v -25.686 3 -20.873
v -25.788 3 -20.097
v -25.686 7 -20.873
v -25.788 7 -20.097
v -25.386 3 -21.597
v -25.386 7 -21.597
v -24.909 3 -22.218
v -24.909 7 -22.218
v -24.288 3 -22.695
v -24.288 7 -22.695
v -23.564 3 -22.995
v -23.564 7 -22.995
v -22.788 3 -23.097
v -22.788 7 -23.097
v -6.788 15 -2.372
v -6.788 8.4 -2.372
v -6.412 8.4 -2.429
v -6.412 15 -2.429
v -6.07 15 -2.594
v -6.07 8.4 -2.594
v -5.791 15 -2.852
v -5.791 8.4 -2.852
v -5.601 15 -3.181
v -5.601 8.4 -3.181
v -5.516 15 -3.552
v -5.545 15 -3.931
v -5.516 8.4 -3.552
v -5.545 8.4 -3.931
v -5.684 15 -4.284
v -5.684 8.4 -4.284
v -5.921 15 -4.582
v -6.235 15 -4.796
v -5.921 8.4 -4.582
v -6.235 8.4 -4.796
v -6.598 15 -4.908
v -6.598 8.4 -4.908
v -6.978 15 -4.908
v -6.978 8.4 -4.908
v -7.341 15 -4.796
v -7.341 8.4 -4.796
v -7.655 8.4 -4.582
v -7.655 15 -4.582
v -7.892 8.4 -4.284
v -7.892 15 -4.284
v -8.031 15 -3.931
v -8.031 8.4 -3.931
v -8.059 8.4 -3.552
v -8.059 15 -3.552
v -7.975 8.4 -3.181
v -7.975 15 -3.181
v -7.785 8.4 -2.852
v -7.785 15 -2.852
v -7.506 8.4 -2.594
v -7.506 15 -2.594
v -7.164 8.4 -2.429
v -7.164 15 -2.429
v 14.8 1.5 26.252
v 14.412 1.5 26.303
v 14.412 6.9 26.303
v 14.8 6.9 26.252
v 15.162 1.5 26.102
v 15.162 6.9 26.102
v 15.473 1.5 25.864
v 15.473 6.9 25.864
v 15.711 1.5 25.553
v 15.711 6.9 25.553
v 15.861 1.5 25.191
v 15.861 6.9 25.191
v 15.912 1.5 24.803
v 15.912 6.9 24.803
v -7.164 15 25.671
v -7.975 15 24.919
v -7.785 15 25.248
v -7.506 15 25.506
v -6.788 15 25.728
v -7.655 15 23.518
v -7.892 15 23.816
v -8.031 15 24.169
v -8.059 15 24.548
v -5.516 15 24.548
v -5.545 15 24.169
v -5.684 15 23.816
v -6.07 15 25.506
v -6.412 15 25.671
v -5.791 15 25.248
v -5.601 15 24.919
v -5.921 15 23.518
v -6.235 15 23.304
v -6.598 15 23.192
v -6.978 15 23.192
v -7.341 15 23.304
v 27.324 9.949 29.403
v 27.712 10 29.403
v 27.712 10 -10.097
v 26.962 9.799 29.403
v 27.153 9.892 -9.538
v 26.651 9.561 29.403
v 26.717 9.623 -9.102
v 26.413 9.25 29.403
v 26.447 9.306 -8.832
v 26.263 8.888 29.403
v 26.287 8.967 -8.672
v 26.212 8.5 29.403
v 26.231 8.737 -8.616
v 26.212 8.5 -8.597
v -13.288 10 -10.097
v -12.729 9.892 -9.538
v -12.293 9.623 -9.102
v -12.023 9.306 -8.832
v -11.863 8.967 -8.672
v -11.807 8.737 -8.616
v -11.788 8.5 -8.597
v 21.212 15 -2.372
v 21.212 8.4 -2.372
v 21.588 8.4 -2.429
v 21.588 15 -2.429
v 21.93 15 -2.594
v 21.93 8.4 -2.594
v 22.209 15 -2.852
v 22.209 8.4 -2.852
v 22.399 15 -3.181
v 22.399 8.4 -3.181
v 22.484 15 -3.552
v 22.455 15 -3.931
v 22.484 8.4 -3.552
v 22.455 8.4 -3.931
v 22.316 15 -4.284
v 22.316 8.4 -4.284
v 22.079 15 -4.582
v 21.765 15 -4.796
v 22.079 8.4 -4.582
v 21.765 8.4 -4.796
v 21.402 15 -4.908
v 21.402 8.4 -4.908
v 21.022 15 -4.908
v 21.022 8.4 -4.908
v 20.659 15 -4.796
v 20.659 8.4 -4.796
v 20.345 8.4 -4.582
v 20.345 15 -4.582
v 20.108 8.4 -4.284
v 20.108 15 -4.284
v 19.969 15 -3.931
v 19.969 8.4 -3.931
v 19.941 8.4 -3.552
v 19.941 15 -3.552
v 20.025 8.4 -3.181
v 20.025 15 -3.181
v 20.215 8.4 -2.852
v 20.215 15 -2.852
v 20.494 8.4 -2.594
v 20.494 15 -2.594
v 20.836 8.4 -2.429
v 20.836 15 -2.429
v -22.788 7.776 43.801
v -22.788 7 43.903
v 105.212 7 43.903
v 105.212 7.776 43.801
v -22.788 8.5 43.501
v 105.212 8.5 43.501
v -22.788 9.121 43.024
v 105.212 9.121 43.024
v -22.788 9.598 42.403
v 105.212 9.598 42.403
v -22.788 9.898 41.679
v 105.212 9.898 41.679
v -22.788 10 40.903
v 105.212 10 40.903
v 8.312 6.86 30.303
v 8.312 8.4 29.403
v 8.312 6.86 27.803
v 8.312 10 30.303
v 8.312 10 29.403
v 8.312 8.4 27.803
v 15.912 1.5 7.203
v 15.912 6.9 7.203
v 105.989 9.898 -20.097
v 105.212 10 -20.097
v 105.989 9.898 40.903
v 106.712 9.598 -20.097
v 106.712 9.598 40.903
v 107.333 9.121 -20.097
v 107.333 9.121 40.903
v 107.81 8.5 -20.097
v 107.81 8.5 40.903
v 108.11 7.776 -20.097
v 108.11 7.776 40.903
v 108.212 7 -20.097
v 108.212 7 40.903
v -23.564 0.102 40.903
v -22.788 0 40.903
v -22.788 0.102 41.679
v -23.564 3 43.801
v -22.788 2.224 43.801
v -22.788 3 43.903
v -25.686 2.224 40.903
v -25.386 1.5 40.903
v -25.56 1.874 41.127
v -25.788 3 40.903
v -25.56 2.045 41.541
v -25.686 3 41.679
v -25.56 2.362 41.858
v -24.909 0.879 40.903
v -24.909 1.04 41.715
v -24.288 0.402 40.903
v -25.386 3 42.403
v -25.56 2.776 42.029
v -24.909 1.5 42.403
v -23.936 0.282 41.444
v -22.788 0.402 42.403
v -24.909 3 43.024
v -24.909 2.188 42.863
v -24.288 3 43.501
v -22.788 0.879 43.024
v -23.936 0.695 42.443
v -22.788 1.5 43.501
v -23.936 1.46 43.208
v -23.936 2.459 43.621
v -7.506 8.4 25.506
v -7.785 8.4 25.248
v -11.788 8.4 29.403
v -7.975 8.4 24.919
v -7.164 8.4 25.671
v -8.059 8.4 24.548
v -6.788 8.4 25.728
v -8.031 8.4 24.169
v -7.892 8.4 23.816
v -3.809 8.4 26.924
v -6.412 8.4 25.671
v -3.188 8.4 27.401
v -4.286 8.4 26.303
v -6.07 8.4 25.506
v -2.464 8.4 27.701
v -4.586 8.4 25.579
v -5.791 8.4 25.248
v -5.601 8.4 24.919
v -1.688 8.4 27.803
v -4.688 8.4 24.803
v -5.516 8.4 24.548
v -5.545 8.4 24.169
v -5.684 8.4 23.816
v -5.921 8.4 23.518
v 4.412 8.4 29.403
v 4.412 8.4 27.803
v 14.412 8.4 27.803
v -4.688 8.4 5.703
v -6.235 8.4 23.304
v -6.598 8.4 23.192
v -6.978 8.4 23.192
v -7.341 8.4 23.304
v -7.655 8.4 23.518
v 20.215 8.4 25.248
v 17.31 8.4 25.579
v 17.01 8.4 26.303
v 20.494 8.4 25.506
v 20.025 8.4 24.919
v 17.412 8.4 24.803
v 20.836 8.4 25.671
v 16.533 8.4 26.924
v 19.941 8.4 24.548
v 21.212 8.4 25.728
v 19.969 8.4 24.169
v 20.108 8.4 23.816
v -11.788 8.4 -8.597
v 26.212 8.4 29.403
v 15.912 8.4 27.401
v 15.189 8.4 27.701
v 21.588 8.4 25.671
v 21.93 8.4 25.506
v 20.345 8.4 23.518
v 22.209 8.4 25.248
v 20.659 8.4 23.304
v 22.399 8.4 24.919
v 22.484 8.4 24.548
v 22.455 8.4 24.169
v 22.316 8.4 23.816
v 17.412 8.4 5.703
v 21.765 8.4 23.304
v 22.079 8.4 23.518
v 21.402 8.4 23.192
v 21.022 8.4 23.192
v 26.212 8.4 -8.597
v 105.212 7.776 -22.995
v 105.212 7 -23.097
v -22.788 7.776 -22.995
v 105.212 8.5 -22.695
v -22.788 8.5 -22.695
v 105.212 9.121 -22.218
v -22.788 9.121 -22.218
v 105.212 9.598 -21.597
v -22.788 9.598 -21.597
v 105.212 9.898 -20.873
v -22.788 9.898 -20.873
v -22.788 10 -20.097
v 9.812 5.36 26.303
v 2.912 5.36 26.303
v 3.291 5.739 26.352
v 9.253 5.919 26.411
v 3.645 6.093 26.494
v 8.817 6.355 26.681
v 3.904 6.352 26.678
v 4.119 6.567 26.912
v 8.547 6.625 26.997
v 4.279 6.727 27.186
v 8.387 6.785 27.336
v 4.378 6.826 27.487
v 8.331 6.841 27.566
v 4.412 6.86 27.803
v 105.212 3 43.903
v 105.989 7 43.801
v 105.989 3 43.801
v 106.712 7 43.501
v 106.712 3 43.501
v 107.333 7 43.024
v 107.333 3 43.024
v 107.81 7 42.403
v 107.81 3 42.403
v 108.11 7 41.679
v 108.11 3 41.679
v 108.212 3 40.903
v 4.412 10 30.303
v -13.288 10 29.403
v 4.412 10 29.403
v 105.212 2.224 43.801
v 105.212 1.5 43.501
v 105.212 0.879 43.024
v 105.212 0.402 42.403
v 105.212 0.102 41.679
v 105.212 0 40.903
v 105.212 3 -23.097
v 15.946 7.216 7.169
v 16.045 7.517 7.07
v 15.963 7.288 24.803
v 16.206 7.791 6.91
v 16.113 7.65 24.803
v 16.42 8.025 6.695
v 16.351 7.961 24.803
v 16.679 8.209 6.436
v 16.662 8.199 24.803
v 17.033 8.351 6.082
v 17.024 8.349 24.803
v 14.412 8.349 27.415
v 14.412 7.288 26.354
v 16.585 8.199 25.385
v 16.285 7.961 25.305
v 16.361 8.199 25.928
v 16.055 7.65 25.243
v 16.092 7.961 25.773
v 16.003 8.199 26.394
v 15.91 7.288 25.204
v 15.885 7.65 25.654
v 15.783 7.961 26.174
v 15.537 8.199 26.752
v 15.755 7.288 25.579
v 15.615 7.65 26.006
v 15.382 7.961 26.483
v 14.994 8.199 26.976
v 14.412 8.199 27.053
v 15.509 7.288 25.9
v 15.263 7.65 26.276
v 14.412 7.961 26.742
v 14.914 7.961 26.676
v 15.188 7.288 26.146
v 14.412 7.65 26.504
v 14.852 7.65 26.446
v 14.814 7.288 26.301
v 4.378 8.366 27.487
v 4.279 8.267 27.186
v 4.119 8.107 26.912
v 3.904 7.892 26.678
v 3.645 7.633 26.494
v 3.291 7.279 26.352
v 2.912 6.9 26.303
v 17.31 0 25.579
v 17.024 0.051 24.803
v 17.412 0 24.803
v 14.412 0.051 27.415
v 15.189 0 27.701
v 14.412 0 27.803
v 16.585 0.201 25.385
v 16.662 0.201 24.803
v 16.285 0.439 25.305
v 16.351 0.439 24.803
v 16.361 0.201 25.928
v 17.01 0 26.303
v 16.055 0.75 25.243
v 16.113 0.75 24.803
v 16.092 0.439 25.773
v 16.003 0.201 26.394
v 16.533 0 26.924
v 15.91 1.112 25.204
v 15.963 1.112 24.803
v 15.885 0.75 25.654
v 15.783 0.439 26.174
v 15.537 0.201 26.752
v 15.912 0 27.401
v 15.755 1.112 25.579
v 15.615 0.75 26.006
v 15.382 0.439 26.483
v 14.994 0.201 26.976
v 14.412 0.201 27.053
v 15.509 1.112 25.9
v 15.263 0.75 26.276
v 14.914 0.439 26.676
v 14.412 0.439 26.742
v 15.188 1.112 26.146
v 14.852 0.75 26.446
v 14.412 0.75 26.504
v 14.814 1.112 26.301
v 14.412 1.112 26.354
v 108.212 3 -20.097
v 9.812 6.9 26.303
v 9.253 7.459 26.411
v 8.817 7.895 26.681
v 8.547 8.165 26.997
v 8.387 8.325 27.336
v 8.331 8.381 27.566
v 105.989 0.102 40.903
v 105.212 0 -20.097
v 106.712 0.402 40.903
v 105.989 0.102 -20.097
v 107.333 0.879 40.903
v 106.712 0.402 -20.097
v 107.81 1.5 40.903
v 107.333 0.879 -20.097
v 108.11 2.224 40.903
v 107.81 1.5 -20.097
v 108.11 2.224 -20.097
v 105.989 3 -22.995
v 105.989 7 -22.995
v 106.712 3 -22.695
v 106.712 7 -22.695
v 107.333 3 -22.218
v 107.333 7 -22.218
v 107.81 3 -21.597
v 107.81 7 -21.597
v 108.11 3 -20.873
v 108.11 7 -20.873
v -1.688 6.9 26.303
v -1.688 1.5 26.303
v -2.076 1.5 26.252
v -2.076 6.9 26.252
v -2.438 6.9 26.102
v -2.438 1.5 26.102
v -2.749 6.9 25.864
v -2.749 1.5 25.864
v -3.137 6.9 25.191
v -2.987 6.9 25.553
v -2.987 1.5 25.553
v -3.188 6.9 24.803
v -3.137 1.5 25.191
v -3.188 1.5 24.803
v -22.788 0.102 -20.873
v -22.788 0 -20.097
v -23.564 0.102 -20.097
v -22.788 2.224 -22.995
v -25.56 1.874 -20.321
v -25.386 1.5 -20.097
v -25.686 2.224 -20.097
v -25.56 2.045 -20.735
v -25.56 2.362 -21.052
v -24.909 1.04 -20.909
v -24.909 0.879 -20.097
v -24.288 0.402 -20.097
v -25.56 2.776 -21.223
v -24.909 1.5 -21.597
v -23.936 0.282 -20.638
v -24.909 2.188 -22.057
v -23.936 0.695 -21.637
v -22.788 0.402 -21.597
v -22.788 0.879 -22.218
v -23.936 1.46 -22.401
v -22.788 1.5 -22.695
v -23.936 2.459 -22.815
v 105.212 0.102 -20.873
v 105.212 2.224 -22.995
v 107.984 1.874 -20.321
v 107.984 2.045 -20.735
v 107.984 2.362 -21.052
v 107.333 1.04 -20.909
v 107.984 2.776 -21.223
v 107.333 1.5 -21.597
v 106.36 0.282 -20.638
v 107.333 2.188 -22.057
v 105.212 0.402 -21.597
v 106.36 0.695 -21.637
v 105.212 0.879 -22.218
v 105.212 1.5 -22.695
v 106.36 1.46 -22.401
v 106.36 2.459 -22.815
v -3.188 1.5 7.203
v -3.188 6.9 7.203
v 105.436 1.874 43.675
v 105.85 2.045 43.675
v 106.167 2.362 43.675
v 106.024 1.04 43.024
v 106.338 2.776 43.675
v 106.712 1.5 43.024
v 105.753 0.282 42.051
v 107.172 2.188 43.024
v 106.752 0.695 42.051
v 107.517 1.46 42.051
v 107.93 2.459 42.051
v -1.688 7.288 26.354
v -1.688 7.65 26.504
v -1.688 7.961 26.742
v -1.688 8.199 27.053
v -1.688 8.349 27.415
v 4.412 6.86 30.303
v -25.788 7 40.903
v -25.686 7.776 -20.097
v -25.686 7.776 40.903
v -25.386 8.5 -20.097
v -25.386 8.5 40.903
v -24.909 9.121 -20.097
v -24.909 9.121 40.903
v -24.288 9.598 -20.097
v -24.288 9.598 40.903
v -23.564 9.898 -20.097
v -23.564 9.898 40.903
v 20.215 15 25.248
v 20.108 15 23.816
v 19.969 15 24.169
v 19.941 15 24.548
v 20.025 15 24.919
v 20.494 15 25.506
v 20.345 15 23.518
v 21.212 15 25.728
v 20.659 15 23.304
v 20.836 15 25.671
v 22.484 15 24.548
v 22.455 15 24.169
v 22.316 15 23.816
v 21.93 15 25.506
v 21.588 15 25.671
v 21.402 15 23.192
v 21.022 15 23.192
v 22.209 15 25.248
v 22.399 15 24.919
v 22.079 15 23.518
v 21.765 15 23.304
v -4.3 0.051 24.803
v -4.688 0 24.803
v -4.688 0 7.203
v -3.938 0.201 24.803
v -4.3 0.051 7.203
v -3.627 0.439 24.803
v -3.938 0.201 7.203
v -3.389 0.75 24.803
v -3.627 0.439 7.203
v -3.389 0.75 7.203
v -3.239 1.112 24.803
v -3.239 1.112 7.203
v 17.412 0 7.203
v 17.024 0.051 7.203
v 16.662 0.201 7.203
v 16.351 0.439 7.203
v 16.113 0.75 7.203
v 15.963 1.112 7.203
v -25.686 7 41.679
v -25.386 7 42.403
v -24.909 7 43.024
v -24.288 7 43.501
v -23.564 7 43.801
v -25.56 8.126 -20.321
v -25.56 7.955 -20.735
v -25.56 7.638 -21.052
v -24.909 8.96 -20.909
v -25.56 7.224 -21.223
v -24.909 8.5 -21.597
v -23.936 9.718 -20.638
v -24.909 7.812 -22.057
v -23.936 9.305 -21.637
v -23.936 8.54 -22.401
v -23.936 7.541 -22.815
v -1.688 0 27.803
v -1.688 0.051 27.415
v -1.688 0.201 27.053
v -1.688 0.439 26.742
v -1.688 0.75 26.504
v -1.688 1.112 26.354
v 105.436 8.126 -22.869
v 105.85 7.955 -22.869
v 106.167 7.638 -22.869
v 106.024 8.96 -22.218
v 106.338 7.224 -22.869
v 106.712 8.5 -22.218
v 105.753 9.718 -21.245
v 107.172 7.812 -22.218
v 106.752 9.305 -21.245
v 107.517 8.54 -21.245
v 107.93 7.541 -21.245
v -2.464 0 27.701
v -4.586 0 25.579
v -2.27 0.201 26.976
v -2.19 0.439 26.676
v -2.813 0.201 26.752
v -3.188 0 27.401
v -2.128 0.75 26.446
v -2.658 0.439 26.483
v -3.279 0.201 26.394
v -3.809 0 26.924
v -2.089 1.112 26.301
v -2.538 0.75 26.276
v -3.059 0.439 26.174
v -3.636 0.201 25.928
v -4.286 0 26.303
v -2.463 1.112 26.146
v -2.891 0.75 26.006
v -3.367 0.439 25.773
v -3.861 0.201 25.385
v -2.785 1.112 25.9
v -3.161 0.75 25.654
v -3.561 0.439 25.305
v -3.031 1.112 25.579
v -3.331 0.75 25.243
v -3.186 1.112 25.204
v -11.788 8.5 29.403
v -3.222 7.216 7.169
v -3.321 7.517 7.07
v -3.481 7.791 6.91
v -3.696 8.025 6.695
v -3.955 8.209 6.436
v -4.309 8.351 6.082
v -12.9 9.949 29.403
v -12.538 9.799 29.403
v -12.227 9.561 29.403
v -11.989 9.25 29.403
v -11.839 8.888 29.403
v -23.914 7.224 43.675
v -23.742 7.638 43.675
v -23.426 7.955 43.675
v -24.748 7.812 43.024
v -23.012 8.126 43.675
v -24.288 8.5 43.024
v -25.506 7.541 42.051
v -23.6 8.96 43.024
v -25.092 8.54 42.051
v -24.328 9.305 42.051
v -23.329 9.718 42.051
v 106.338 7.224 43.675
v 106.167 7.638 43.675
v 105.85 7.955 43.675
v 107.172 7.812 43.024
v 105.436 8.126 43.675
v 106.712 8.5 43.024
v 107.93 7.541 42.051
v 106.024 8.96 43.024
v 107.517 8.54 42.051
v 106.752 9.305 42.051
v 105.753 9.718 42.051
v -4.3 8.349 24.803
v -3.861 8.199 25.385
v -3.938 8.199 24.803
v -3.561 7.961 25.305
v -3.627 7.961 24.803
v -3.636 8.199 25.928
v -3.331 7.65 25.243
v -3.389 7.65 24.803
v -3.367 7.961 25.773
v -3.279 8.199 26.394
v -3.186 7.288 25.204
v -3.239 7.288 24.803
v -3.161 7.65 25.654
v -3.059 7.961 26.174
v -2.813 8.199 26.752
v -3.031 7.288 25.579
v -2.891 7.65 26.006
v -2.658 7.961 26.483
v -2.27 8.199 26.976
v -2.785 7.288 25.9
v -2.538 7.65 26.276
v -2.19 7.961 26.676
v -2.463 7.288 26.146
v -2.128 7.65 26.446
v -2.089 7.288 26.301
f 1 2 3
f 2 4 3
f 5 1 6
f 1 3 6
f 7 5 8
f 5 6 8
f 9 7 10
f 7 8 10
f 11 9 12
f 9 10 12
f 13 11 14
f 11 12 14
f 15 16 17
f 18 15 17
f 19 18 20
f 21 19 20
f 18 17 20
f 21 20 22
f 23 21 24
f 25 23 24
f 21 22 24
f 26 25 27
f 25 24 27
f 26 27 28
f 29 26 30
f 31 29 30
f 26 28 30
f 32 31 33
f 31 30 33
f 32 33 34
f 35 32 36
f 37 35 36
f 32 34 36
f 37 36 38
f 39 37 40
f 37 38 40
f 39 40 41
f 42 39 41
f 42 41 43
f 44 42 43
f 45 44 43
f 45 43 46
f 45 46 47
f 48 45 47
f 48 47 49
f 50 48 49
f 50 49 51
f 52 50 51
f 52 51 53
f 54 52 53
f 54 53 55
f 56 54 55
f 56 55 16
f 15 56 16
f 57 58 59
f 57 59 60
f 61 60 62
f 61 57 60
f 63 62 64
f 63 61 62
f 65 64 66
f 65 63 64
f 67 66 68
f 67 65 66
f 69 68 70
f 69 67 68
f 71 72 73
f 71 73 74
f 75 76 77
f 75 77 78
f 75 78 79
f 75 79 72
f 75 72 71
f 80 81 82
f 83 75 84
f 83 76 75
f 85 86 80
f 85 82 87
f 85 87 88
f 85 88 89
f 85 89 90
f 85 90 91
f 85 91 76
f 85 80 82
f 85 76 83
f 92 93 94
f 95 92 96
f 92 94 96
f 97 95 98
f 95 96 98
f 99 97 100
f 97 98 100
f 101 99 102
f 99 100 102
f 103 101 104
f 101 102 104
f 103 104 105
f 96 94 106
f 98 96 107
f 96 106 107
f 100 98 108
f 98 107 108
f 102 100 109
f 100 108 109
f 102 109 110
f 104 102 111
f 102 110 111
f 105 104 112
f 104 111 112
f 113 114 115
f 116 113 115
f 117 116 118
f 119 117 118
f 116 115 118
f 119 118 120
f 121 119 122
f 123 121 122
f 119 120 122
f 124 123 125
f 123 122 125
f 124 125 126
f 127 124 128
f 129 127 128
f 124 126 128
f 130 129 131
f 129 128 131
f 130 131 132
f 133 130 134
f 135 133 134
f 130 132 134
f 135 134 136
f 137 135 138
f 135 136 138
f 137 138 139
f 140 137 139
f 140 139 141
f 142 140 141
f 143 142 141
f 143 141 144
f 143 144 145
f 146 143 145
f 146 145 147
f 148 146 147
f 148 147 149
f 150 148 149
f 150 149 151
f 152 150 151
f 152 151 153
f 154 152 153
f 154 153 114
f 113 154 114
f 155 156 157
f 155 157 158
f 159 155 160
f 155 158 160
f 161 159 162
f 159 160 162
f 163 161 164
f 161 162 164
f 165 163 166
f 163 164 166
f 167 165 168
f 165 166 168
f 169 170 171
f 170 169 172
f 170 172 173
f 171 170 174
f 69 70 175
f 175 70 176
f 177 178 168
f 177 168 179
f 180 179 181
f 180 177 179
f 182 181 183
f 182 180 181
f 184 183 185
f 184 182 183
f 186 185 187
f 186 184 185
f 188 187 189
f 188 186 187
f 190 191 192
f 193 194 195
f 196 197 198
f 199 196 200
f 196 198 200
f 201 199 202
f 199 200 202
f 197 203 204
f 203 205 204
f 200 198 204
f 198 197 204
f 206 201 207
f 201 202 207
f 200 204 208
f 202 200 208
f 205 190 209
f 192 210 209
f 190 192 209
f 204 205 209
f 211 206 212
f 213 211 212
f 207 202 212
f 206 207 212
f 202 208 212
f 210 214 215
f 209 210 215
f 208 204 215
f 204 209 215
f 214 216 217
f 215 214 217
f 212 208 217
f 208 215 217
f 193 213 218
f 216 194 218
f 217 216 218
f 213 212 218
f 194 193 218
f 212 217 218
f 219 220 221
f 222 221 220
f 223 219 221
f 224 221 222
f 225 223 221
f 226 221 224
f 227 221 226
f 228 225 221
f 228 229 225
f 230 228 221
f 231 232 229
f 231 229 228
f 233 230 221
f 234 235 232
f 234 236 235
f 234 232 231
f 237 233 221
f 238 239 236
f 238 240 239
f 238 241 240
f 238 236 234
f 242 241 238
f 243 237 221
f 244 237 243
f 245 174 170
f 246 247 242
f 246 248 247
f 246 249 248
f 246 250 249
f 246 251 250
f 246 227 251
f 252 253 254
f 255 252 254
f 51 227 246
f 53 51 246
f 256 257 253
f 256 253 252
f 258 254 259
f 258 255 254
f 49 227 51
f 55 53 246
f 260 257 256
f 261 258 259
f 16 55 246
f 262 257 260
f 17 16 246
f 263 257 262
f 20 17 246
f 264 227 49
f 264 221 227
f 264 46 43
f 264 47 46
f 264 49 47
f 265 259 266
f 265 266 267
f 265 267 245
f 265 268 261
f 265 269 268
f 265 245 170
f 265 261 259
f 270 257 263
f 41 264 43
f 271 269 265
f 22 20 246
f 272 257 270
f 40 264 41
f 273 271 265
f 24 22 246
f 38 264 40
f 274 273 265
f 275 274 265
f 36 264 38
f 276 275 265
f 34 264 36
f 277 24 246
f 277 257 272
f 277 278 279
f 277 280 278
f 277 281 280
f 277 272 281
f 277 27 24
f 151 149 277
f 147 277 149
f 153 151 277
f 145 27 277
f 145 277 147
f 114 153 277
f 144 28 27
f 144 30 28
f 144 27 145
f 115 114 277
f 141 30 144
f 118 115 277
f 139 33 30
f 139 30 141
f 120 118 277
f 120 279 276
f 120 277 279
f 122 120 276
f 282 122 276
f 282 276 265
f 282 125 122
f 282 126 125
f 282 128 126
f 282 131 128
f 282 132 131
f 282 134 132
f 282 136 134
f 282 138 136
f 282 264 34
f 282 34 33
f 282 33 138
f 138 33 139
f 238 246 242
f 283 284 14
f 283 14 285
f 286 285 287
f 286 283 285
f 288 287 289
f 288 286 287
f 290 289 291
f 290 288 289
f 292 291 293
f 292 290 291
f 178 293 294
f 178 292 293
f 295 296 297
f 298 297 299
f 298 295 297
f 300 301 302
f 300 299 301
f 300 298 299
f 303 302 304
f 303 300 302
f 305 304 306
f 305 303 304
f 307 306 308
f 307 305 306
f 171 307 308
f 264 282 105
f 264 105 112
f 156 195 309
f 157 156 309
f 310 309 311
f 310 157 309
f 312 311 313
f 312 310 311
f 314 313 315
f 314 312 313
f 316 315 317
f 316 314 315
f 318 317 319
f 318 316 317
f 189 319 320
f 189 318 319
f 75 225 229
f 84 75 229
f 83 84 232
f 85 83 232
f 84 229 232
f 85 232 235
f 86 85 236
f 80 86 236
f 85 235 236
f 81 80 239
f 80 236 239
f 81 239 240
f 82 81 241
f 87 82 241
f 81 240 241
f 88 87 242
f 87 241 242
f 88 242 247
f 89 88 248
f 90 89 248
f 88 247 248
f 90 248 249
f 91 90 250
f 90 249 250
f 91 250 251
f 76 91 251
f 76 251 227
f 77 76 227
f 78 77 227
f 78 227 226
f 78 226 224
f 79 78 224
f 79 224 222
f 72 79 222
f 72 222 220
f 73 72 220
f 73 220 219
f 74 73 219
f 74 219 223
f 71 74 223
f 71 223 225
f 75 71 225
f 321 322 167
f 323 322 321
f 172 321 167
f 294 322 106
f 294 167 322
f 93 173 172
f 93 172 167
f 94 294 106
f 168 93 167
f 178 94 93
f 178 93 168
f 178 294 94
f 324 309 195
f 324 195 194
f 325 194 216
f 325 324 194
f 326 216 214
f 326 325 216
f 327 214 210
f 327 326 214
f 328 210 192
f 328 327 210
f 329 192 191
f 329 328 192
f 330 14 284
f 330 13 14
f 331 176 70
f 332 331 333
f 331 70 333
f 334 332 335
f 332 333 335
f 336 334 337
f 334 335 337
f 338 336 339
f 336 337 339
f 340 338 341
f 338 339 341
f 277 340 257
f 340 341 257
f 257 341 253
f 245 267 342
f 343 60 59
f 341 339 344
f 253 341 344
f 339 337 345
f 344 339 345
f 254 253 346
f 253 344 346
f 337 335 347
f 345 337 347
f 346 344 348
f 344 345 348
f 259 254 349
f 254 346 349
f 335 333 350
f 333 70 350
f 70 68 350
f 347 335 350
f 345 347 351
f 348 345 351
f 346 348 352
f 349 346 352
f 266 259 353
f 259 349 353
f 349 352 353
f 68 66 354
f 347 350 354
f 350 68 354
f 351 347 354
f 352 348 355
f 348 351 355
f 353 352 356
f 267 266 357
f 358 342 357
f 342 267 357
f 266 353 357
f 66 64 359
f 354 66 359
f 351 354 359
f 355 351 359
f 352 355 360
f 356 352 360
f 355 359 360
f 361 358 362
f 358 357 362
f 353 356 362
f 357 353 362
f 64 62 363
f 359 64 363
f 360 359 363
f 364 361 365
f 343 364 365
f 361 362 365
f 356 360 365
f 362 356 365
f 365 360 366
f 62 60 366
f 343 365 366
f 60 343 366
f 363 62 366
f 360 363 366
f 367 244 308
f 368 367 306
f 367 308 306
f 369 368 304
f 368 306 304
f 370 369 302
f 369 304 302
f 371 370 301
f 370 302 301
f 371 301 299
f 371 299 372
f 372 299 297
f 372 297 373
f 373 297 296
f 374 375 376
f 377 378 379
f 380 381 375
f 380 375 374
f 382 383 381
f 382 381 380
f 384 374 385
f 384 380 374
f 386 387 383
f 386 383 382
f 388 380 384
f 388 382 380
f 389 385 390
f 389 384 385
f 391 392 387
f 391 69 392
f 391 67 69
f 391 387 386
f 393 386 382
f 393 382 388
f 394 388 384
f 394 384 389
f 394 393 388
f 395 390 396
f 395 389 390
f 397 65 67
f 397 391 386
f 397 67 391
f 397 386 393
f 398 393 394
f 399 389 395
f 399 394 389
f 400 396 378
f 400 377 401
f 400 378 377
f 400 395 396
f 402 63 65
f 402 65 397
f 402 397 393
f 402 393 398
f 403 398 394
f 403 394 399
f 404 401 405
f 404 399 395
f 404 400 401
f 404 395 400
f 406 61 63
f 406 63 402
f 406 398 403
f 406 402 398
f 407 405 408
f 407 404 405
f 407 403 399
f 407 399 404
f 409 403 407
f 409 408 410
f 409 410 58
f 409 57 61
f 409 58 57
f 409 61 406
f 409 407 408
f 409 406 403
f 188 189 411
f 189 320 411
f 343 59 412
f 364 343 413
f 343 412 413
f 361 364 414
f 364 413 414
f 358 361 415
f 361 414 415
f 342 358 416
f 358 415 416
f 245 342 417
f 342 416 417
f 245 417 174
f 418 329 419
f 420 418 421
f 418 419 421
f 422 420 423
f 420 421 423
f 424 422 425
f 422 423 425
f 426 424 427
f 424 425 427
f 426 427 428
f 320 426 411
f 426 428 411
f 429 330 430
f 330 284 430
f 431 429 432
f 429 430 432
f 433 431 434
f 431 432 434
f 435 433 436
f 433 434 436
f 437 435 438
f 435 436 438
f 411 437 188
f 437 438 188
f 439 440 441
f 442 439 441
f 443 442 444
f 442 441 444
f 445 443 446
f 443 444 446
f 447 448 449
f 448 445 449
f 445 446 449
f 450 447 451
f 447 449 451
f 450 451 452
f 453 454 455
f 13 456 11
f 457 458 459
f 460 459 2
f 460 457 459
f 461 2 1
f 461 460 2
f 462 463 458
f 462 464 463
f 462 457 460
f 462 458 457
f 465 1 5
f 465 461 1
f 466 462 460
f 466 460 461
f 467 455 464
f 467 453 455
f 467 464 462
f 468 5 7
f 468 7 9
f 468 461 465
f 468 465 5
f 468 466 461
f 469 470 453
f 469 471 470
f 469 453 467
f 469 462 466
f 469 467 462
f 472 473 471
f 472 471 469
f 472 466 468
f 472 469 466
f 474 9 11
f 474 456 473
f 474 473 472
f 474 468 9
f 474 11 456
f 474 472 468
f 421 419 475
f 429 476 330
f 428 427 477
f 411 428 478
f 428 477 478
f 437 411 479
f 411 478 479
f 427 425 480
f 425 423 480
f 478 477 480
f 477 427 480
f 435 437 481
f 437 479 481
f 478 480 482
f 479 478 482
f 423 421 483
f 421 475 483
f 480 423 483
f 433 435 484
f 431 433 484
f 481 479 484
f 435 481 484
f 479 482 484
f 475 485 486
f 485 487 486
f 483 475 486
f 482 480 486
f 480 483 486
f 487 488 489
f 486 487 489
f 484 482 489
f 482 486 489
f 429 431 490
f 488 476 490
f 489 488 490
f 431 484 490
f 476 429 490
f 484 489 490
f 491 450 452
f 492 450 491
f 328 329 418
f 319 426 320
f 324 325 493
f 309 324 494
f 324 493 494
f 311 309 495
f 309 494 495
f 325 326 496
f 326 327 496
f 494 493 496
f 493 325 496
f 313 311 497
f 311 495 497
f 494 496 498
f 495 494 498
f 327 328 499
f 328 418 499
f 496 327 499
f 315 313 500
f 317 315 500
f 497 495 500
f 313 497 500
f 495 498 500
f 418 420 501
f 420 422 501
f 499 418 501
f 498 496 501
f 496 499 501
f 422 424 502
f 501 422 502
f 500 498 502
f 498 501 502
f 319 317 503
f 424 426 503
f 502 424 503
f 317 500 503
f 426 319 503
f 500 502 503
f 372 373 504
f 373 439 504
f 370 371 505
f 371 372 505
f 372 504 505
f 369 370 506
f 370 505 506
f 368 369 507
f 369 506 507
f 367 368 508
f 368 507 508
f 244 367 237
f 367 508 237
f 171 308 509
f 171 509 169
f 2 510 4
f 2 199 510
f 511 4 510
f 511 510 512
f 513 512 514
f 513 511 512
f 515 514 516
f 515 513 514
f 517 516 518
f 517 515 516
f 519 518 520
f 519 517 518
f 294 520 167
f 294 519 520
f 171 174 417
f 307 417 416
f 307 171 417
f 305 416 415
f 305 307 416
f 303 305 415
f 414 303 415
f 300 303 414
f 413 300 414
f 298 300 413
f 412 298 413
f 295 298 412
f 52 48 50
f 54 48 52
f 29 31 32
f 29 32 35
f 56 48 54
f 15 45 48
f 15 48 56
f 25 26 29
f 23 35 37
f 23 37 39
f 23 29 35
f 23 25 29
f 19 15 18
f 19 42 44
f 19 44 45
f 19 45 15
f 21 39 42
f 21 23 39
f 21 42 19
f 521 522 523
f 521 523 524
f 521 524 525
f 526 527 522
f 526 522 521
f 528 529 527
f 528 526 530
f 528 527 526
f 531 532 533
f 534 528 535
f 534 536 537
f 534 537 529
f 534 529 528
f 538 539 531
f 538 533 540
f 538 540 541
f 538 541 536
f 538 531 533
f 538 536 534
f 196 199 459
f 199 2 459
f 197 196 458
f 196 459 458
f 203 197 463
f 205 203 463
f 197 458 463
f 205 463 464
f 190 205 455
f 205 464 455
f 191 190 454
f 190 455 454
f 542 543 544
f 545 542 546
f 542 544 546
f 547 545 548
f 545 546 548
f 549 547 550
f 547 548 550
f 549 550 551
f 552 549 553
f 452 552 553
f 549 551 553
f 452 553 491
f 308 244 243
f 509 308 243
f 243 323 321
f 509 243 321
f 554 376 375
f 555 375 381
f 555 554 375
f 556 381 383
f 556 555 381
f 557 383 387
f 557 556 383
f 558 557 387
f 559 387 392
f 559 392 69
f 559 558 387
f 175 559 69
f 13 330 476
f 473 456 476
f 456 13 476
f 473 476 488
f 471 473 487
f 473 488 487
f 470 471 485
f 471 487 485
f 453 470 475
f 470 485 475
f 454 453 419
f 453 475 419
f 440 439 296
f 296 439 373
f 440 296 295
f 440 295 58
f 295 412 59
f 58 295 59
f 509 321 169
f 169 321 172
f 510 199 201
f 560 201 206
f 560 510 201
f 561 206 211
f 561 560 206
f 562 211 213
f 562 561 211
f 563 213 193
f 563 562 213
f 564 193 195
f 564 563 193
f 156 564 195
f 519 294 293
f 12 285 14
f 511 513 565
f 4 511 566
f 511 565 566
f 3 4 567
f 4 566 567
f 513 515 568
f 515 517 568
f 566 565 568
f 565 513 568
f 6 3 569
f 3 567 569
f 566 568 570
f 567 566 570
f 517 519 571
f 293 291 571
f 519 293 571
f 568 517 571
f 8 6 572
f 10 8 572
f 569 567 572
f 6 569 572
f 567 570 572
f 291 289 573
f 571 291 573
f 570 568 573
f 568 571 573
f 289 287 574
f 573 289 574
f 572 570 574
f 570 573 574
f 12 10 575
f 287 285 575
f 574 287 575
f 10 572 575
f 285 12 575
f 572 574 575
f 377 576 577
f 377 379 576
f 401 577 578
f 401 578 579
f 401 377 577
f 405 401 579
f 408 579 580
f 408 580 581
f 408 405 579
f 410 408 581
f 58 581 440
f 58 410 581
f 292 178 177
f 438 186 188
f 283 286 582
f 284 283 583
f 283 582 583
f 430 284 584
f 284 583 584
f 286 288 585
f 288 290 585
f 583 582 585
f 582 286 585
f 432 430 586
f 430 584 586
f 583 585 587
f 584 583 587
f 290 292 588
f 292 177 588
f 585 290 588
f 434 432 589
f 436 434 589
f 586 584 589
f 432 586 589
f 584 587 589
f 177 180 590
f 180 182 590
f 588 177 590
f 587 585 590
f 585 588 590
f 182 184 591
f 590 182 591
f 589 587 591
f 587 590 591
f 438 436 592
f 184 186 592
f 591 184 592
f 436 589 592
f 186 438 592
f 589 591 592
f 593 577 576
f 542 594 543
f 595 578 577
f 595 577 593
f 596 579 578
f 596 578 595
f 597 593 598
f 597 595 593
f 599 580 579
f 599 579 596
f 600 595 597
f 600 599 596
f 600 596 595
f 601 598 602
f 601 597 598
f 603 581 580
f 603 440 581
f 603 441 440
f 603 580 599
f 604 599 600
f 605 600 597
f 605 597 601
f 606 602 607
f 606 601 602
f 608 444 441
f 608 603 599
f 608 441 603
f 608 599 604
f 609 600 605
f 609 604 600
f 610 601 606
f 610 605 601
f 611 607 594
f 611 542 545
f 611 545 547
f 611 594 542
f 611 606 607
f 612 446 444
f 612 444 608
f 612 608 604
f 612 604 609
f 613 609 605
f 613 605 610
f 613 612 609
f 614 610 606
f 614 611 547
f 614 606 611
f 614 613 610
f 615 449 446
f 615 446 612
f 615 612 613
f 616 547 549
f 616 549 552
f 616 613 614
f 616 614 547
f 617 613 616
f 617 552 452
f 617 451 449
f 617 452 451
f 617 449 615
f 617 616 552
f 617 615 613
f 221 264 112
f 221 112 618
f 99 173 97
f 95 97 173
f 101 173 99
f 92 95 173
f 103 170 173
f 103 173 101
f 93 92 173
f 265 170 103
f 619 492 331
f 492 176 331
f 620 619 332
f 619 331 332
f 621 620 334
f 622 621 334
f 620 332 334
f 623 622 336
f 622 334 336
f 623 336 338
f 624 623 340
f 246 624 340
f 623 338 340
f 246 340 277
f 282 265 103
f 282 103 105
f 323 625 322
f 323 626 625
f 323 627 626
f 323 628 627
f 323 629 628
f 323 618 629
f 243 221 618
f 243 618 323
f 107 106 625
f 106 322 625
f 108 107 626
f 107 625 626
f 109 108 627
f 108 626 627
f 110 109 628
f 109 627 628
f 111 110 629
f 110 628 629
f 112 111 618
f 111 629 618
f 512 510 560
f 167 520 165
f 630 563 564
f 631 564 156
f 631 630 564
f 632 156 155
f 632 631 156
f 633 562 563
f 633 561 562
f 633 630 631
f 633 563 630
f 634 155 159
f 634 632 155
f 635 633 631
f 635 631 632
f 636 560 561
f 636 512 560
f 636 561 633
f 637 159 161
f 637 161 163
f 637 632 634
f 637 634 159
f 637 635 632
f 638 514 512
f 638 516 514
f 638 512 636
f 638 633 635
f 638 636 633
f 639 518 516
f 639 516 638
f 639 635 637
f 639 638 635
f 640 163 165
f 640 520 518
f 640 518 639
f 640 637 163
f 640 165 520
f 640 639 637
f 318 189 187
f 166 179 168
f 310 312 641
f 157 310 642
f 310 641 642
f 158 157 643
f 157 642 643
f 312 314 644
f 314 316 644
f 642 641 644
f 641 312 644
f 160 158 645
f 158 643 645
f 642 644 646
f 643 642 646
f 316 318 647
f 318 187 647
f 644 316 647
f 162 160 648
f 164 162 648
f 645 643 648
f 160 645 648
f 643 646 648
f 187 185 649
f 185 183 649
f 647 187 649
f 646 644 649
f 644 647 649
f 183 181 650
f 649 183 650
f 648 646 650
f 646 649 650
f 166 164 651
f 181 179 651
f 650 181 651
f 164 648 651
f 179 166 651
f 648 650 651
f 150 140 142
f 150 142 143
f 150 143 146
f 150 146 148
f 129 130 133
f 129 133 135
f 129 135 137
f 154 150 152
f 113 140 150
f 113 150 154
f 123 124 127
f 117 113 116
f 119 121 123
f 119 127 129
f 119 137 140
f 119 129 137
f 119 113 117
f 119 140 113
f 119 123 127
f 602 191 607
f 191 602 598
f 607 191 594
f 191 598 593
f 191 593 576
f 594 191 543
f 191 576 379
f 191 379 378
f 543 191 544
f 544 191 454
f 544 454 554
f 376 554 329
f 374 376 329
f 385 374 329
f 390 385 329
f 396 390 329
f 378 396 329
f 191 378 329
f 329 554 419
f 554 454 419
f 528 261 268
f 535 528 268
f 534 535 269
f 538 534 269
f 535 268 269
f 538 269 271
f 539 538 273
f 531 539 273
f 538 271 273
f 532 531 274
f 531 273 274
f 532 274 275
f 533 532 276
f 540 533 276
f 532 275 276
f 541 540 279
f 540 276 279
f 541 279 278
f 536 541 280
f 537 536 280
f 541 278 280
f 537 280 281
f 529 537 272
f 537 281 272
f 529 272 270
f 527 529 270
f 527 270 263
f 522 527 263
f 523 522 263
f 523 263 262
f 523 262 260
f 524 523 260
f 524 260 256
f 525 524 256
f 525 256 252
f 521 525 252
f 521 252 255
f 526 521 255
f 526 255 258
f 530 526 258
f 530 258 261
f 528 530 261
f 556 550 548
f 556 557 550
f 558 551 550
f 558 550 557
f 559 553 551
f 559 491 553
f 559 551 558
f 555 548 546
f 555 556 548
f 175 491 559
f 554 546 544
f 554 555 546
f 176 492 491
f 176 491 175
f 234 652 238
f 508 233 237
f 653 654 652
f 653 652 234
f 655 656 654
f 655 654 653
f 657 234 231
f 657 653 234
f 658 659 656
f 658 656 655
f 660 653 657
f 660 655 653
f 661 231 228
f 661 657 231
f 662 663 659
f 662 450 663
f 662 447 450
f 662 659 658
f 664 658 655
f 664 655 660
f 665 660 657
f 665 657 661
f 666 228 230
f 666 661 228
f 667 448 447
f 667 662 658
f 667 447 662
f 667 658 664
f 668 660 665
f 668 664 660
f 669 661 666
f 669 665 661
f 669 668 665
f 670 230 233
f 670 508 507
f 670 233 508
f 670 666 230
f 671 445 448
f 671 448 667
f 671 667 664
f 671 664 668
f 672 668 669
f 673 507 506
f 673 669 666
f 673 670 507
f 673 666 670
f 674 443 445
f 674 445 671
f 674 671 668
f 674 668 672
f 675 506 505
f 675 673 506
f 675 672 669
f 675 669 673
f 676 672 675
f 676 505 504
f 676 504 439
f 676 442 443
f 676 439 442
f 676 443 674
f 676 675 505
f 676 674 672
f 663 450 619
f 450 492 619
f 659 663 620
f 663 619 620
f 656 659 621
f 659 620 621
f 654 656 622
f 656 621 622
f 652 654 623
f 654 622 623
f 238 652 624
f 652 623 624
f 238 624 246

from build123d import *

# Parameters (mm, degrees)
SKETCH1_W           = 134
SKETCH1_H           = 67
BOSS_EXTRUDE1_DEPTH = 10
SKETCH2_W           = 19.1
SKETCH2_H           = 19.1
CUT_EXTRUDE1_DEPTH  = 10
SKETCH2_3_R         = 1.275
BOSS_EXTRUDE2_DEPTH = 5
CUT_EXTRUDE3_START  = -1.6
SKETCH2_6_R         = 1.275
CUT_EXTRUDE3_DEPTH  = 1.6
SKETCH2_5_W         = 3.9
SKETCH2_5_H         = 3.1
SKETCH2_5_H_2       = 0.9
CUT_EXTRUDE2_DEPTH  = 3.14
FILLET1_R           = 3
FILLET2_R           = 1.5
FILLET3_R           = 1.5


with BuildPart() as part:
    # Sketch1 → Boss-Extrude1 (new body)
    with BuildSketch(Plane(origin=(0, 0, 0), x_dir=(1, 0, 0), z_dir=(0, 1, 0))):
        with Locations((41.212068984, -10.4030388)):
            Rectangle(SKETCH1_W, SKETCH1_H)
    extrude(amount=BOSS_EXTRUDE1_DEPTH)

    # Sketch2 → Cut-Extrude1 (cut)
    with BuildSketch(Plane(origin=(0, 10, 0), x_dir=(1, 0, 0), z_dir=(0, 1, 0))):
        with Locations((6.362068984, -16.7530388)):
            Rectangle(SKETCH2_W, SKETCH2_H)
    extrude(amount=-CUT_EXTRUDE1_DEPTH, mode=Mode.SUBTRACT)

    # Sketch2<3> → Boss-Extrude2 (add)
    with BuildSketch(Plane(origin=(0, 10, 0), x_dir=(1, 0, 0), z_dir=(0, 1, 0))):
        with Locations(Location((-6.787931016, 3.6469612, 0), (0, 0, 270))):
            Circle(SKETCH2_3_R)
        with Locations(Location((-6.787931016, -24.4530388, 0), (0, 0, 270))):
            Circle(SKETCH2_3_R)
        with Locations(Location((21.212068984, -24.4530388, 0), (0, 0, 270))):
            Circle(SKETCH2_3_R)
        with Locations(Location((21.212068984, 3.6469612, 0), (0, 0, 270))):
            Circle(SKETCH2_3_R)
    extrude(amount=BOSS_EXTRUDE2_DEPTH)

    # Sketch2<6> → Cut-Extrude3 (cut)
    with BuildSketch(Plane(origin=(0, 10, 0), x_dir=(1, 0, 0), z_dir=(0, 1, 0)).offset(CUT_EXTRUDE3_START)):
        Polygon((26.212068984, 8.5969612), (-11.787931016, 8.5969612), (-11.787931016, -29.4030388), (4.412068984, -29.4030388), (4.412068984, -26.3030388), (-3.187931016, -26.3030388), (-3.187931016, -7.2030388), (15.912068984, -7.2030388), (15.912068984, -26.3030388), (8.312068984, -26.3030388), (8.312068984, -29.4030388), (26.212068984, -29.4030388), align=None)
        with Locations(Location((-6.787931016, -24.4530388, 0), (0, 0, 270))):
            Circle(SKETCH2_6_R, mode=Mode.SUBTRACT)
        with Locations(Location((21.212068984, -24.4530388, 0), (0, 0, 270))):
            Circle(SKETCH2_6_R, mode=Mode.SUBTRACT)
        with Locations(Location((-6.787931016, 3.6469612, 0), (0, 0, 270))):
            Circle(SKETCH2_6_R, mode=Mode.SUBTRACT)
        with Locations(Location((21.212068984, 3.6469612, 0), (0, 0, 270))):
            Circle(SKETCH2_6_R, mode=Mode.SUBTRACT)
    extrude(amount=CUT_EXTRUDE3_DEPTH, mode=Mode.SUBTRACT)

    # Sketch2<5> → Cut-Extrude2 (cut)
    with BuildSketch(Plane(origin=(0, 10, 0), x_dir=(1, 0, 0), z_dir=(0, 1, 0))):
        with Locations((6.362068984, -27.8530388)):
            Rectangle(SKETCH2_5_W, SKETCH2_5_H)
        with Locations((6.362068984, -29.8530388)):
            Rectangle(SKETCH2_5_W, SKETCH2_5_H_2)
    extrude(amount=-CUT_EXTRUDE2_DEPTH, mode=Mode.SUBTRACT)

    # Fillet1
    fillet1_edges = [part.edges().sort_by_distance(p)[0] for p in [
        (108.212068984, 10, 10.4030388),
        (41.212068984, 10, -23.0969612),
        (-25.787931016, 10, 10.4030388),
        (41.212068984, 0, -23.0969612),
        (108.212068984, 0, 10.4030388),
        (41.212068984, 0, 43.9030388),
        (-25.787931016, 0, 10.4030388),
        (-25.787931016, 5, -23.0969612),
        (108.212068984, 5, -23.0969612),
        (108.212068984, 5, 43.9030388),
        (-25.787931016, 5, 43.9030388),
        (41.212068984, 10, 43.9030388),
    ]]
    fillet(fillet1_edges, radius=FILLET1_R)

    # Fillet2
    fillet2_edges = [part.edges().sort_by_distance(p)[0] for p in [
        (4.412068984, 7.63, 26.3030388),
        (6.362068984, 6.86, 26.3030388),
        (-3.187931016, 4.2, 26.3030388),
        (15.912068984, 4.2, 26.3030388),
        (15.912068984, 0, 16.7530388),
        (6.362068984, 0, 26.3030388),
        (-3.187931016, 0, 16.7530388),
        (15.912068984, 8.4, 16.7530388),
        (6.362068984, 8.4, 7.2030388),
        (12.112068984, 8.4, 26.3030388),
        (-3.187931016, 8.4, 16.7530388),
        (0.612068984, 8.4, 26.3030388),
        (8.312068984, 7.63, 26.3030388),
    ]]
    fillet(fillet2_edges, radius=FILLET2_R)

    # Fillet3
    fillet3_edges = [part.edges().sort_by_distance(p)[0] for p in [
        (7.212068984, 10, -8.5969612),
        (26.212068984, 10, 10.4030388),
        (-11.787931016, 10, 10.4030388),
    ]]
    fillet(fillet3_edges, radius=FILLET3_R)


solid = part.part
